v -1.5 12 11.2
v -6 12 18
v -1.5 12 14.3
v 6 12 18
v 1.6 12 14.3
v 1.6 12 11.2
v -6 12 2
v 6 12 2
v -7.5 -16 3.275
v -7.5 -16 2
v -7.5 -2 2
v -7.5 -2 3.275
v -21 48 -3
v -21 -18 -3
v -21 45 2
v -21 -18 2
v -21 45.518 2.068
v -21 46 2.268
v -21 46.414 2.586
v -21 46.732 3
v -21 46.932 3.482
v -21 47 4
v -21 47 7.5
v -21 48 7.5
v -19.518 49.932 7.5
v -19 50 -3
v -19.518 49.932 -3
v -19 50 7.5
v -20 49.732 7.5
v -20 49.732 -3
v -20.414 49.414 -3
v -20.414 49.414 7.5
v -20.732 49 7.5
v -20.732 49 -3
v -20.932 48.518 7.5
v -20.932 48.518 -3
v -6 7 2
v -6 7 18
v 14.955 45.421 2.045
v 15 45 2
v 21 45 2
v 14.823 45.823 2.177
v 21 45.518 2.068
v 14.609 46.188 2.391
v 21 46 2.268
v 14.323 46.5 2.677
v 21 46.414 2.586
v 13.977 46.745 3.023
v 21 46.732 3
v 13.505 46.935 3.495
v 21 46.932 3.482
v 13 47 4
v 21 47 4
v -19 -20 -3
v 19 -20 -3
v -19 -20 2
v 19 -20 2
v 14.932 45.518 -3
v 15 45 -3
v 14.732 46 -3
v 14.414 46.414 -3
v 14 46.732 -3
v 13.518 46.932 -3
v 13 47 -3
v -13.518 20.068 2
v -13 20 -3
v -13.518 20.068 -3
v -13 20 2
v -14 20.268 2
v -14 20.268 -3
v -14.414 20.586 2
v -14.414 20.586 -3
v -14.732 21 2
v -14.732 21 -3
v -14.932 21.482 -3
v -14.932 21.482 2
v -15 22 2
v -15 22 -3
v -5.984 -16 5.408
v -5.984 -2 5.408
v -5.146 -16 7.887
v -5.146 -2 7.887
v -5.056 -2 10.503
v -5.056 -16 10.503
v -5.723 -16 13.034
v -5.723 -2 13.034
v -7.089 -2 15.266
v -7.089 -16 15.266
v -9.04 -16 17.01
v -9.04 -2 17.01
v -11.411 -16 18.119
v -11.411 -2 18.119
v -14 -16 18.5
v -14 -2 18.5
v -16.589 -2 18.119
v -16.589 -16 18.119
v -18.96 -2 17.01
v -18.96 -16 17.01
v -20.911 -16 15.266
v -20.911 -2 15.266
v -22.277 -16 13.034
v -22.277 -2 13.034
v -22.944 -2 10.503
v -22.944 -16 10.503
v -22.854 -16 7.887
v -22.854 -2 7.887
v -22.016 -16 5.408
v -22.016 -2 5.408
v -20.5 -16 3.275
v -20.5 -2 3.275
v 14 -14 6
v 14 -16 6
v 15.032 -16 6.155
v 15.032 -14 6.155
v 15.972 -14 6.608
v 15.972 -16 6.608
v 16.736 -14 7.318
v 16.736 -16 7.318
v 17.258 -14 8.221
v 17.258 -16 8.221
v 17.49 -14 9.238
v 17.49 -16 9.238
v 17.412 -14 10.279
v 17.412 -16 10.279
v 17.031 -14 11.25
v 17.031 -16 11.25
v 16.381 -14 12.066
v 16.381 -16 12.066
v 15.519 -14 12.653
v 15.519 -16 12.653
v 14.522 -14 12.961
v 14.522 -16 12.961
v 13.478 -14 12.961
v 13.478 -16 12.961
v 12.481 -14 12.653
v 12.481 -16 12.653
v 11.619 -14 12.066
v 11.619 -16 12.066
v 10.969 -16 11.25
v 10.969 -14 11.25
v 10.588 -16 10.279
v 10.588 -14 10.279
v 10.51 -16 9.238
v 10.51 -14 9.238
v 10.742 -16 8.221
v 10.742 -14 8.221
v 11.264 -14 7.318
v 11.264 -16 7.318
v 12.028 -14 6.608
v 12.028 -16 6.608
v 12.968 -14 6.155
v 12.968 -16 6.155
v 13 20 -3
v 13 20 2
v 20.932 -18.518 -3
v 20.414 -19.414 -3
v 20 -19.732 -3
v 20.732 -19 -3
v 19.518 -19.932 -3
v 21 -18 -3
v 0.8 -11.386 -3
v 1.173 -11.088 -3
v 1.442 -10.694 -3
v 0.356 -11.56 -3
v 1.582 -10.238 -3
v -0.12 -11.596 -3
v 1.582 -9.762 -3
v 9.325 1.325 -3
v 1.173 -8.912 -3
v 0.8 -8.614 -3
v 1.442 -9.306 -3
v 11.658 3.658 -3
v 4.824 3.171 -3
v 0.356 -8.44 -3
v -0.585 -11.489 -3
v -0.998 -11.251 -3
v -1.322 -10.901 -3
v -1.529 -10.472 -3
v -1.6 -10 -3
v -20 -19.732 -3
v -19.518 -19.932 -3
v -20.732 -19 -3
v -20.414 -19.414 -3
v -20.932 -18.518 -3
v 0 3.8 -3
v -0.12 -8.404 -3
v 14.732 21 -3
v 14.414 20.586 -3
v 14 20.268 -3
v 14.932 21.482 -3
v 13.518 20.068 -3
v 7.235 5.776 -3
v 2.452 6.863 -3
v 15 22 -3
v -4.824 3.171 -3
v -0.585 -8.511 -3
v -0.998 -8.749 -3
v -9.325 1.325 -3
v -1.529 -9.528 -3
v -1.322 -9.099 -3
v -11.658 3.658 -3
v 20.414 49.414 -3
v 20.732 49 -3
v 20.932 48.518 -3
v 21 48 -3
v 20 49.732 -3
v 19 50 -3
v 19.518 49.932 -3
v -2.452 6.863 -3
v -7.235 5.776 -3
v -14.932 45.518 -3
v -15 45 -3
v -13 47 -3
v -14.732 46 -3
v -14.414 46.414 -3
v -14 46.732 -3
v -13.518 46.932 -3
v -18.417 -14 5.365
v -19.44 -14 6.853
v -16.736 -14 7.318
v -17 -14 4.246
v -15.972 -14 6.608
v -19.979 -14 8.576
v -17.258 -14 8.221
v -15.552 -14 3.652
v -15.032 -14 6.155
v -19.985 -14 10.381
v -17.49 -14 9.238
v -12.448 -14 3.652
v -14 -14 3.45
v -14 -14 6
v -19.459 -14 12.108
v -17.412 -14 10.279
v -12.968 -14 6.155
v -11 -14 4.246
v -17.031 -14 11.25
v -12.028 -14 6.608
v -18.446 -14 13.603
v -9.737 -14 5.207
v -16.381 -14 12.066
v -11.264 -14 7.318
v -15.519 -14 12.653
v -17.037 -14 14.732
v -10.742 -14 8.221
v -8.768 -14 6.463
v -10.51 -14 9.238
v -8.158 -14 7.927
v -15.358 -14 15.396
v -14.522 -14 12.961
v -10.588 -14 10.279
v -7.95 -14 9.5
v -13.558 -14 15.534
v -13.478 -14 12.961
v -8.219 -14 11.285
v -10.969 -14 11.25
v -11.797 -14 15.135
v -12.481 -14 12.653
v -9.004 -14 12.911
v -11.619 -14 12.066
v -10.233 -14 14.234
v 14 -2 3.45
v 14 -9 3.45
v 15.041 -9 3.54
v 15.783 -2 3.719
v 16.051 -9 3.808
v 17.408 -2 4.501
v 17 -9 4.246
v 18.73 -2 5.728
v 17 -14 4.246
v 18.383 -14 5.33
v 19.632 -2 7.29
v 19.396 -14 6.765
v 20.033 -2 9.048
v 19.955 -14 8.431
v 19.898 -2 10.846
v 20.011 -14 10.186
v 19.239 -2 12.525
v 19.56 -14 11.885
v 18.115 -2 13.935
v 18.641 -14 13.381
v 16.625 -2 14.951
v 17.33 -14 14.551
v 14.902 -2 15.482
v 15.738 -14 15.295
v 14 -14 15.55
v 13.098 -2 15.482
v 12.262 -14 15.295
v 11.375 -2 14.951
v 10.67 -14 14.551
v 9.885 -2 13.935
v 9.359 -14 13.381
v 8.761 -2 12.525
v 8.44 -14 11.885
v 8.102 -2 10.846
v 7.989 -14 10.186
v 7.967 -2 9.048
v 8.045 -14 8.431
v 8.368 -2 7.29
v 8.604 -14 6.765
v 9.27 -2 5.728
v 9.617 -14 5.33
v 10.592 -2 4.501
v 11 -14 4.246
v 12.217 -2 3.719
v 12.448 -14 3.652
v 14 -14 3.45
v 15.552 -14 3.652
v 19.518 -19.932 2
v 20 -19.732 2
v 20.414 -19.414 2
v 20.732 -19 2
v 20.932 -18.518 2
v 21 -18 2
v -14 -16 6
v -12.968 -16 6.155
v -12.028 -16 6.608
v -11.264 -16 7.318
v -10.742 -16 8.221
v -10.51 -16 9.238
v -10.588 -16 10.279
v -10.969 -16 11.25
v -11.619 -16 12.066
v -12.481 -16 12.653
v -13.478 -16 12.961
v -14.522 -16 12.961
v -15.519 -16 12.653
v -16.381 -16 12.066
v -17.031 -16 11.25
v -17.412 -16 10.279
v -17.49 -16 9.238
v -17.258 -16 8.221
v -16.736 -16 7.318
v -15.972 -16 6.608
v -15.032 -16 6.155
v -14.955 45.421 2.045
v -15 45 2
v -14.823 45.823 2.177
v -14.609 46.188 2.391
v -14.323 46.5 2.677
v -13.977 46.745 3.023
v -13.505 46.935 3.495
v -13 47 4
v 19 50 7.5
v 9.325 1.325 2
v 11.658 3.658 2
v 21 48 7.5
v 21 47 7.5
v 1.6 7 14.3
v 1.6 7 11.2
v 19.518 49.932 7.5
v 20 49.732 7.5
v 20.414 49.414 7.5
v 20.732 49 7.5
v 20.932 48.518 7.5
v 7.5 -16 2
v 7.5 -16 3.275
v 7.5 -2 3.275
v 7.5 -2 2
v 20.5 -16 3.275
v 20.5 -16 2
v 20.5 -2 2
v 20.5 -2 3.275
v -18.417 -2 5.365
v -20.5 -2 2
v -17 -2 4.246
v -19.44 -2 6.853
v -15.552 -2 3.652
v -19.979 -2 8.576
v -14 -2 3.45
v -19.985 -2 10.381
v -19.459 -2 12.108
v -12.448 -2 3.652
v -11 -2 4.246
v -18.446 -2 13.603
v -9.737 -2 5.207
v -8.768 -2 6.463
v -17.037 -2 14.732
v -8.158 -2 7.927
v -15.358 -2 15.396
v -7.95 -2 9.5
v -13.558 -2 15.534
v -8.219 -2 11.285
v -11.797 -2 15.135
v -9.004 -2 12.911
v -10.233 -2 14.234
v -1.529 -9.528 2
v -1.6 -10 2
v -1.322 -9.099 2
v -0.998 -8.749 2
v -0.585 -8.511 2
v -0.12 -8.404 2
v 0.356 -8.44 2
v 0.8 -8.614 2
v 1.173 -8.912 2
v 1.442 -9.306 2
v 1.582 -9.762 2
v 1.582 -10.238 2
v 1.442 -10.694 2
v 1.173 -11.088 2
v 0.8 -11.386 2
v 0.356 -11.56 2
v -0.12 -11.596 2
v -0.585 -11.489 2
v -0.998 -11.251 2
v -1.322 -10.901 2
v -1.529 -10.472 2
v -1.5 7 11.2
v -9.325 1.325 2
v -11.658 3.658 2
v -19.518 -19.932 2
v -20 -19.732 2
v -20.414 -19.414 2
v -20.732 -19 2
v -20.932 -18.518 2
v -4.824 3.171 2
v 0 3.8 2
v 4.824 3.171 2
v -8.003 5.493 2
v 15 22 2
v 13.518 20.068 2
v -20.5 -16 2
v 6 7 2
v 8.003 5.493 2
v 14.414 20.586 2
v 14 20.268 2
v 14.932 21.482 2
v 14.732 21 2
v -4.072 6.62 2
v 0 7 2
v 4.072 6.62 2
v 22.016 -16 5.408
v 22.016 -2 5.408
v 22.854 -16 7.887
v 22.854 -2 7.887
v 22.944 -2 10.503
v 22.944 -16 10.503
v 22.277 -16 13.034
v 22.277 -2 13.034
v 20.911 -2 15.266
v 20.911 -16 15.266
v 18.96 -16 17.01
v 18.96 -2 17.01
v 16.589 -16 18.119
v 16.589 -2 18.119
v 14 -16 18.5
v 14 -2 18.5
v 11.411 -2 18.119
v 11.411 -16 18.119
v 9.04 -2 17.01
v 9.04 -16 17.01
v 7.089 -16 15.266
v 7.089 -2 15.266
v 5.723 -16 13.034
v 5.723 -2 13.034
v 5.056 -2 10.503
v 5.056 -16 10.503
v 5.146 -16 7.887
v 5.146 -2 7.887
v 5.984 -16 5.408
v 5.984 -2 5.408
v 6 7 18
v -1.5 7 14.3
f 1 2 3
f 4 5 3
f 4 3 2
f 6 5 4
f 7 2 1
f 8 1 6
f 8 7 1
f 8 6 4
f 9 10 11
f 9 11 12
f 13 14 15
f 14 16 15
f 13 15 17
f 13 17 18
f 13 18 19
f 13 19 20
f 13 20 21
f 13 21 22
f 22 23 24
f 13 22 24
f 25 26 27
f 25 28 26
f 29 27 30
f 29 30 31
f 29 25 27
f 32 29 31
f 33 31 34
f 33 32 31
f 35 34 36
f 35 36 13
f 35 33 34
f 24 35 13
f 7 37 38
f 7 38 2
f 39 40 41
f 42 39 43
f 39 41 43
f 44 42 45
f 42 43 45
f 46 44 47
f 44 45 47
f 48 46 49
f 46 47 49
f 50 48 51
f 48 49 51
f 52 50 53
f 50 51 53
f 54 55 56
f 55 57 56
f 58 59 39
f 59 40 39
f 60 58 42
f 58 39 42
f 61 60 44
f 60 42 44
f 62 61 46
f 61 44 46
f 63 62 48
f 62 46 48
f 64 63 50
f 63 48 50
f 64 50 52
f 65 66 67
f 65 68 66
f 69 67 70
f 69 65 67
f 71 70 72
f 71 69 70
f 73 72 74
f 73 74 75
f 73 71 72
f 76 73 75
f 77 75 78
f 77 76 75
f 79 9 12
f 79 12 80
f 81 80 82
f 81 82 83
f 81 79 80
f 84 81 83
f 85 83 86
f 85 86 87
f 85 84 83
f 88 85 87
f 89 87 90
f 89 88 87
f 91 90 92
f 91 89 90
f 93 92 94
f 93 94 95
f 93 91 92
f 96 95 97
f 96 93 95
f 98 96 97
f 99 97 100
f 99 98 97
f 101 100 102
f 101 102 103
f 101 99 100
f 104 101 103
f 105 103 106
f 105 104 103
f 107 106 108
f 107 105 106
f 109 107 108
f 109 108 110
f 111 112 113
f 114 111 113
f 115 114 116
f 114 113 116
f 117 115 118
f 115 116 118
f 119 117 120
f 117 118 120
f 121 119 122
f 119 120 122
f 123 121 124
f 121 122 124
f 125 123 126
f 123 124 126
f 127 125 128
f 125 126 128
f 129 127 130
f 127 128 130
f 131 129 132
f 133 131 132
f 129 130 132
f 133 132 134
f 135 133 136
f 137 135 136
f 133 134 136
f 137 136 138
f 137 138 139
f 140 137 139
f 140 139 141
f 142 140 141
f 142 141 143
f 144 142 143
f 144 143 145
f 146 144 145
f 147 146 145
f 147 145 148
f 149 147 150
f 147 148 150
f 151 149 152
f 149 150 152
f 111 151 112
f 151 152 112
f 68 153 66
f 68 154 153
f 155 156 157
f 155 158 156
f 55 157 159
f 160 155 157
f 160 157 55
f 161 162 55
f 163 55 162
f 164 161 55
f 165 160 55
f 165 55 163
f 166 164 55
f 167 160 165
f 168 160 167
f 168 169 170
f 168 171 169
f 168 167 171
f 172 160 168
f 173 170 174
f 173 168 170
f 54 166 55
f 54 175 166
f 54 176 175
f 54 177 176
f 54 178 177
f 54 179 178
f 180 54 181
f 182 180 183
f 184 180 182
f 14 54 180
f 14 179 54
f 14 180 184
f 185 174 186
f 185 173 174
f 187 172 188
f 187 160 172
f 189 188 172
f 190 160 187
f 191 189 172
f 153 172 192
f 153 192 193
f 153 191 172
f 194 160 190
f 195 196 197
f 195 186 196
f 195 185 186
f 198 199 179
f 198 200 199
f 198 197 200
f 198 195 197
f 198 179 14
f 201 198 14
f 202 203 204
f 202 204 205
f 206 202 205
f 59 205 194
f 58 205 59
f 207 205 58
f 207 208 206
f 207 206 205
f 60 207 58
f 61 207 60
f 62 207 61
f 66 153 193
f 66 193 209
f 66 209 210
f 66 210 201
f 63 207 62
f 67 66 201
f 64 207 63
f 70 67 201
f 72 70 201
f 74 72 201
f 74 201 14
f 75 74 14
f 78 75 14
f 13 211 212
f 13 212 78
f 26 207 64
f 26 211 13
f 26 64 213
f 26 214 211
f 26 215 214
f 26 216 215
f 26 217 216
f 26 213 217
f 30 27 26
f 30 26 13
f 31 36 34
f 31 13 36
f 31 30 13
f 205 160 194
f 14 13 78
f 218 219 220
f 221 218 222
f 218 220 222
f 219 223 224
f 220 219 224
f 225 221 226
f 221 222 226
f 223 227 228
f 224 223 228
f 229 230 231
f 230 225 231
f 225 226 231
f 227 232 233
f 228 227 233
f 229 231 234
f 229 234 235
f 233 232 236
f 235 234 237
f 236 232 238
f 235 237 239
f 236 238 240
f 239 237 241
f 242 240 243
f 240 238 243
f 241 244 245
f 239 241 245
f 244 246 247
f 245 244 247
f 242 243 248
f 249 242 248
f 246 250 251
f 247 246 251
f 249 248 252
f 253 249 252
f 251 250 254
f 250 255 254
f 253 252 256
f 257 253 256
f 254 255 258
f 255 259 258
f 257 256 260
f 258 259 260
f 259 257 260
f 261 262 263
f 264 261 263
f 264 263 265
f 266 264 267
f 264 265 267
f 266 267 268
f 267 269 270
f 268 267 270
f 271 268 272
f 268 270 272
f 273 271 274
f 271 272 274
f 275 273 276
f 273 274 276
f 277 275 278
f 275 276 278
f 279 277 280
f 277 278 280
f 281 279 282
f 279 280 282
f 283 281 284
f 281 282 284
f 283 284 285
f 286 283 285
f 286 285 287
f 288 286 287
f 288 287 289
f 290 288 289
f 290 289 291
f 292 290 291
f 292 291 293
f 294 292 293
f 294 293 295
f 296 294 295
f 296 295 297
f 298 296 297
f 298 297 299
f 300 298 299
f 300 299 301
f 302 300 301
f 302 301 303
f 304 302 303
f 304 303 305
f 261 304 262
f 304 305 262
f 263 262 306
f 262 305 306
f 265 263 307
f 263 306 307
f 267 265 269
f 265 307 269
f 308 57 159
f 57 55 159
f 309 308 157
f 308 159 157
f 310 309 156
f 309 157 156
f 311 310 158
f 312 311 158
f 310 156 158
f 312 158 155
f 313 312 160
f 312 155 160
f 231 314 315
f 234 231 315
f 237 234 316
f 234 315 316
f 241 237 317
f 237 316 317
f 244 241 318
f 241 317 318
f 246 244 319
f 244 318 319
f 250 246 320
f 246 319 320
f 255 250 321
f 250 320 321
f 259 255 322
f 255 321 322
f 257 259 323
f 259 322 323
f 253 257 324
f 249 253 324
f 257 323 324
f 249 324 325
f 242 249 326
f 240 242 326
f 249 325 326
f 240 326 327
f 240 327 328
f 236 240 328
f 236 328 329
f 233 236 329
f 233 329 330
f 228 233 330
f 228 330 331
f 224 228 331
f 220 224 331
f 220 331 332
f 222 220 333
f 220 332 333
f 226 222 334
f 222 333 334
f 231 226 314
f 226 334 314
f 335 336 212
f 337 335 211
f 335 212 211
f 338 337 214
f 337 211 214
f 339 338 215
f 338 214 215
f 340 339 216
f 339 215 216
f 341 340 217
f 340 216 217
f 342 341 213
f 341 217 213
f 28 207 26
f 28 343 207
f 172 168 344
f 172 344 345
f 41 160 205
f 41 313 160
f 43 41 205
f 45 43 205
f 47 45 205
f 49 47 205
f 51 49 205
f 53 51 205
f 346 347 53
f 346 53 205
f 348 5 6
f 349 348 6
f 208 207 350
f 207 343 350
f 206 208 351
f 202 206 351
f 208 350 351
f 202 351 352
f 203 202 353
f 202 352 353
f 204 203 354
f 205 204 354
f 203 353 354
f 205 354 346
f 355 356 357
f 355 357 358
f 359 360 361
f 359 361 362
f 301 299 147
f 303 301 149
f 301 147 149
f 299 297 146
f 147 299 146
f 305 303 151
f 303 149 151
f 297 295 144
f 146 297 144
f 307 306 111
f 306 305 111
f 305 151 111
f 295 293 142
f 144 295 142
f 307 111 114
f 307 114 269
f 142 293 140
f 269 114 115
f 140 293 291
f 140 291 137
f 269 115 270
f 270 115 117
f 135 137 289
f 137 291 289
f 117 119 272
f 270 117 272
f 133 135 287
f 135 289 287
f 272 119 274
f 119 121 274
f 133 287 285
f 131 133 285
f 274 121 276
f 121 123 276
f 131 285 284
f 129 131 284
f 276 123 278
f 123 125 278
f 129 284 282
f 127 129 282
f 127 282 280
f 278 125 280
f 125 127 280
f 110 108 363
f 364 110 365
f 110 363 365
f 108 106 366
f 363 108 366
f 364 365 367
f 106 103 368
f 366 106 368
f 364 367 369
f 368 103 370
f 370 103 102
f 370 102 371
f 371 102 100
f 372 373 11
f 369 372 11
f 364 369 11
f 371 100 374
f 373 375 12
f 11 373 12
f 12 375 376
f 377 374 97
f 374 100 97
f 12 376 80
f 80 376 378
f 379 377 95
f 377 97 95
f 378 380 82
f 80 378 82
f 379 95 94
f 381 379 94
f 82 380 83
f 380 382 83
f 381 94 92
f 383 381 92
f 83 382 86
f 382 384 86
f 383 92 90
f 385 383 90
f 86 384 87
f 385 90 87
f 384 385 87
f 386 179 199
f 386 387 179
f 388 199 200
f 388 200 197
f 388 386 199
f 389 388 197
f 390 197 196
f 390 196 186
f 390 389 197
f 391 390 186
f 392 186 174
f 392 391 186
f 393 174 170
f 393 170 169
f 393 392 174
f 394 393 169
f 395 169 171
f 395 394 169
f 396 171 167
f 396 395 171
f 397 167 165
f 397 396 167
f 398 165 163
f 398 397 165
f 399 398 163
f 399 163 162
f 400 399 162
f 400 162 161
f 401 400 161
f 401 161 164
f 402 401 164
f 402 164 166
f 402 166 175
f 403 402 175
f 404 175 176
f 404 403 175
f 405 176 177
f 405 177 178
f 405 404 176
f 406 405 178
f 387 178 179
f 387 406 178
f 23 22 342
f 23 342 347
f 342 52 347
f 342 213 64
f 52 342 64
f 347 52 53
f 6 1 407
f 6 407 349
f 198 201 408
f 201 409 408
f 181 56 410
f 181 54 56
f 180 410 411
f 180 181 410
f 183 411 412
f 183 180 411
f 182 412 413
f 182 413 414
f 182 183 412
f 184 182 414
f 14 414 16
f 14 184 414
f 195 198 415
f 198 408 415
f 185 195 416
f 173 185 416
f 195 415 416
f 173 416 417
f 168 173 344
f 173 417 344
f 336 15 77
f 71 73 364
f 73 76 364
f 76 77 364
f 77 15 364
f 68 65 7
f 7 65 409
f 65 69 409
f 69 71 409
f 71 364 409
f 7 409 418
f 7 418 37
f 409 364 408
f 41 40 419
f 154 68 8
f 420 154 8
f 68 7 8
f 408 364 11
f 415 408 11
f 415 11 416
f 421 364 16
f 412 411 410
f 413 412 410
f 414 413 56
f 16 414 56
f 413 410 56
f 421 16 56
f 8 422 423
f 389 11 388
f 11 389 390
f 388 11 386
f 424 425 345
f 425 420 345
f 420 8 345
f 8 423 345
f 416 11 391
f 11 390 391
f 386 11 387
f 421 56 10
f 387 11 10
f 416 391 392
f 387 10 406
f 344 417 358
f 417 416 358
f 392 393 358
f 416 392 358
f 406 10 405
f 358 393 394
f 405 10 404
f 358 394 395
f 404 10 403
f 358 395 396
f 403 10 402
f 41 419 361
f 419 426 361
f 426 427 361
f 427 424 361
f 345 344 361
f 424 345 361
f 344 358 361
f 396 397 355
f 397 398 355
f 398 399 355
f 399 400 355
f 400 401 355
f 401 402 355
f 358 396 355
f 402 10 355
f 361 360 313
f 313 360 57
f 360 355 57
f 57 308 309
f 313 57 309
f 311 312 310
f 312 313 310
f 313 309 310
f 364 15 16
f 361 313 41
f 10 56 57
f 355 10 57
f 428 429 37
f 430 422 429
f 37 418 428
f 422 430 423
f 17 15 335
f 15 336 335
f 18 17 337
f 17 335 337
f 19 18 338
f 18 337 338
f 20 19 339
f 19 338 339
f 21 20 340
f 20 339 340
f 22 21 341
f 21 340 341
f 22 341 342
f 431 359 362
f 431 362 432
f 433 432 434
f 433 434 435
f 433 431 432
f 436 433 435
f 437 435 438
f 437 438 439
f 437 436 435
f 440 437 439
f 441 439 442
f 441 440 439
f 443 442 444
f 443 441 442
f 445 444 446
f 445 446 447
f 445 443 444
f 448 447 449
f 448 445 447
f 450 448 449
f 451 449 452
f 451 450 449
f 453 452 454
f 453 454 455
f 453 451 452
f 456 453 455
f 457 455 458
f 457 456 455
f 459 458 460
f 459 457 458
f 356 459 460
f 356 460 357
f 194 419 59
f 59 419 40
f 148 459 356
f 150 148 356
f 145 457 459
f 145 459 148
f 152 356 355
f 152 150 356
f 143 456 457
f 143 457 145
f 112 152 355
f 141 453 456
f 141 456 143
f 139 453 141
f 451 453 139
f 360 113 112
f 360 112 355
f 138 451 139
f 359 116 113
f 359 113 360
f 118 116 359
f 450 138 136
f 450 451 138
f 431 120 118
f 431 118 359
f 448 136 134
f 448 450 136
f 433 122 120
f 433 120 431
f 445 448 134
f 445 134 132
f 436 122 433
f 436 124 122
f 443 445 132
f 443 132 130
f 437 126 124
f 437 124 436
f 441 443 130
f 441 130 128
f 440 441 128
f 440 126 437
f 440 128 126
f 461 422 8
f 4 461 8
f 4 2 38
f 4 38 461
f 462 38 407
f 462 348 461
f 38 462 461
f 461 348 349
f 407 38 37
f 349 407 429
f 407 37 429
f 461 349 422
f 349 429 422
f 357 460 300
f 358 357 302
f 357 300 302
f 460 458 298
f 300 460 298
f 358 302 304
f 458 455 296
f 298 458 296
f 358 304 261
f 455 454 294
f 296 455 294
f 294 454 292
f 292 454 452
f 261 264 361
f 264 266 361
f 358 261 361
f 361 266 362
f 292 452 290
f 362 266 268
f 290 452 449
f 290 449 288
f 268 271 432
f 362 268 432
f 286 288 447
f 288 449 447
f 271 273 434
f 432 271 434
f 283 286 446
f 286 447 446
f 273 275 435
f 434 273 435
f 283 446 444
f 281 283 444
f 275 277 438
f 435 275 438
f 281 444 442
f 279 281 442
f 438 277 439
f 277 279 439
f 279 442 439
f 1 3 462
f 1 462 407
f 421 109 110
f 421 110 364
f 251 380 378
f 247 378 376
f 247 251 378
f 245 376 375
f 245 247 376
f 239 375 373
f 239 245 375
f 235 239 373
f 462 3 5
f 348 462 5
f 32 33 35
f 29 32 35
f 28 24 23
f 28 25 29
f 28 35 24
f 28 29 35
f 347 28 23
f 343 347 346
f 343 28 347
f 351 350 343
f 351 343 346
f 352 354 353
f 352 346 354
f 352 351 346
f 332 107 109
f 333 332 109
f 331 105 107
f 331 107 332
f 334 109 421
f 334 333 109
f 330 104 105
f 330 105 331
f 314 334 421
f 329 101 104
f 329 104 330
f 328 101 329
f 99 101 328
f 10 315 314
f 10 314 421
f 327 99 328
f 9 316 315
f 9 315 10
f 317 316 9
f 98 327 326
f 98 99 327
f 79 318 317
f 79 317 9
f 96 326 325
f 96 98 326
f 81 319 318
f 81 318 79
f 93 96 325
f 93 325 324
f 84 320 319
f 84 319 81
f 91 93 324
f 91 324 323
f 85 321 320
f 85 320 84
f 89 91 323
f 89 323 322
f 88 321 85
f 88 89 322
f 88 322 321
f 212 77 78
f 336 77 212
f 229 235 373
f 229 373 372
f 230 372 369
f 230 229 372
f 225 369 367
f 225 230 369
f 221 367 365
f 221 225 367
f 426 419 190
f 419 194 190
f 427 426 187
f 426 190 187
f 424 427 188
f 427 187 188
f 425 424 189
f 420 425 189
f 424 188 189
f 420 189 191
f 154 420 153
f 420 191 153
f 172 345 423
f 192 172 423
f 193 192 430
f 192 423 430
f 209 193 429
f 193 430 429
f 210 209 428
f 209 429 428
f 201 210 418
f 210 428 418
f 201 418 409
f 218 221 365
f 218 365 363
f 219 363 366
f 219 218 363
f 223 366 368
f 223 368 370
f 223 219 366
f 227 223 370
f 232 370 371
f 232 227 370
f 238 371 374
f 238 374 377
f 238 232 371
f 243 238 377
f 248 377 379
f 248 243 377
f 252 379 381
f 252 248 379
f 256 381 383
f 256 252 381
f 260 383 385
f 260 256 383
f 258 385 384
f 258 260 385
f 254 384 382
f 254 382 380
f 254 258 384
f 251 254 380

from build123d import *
from build123d.topology import SkipClean

# Parameters (mm, degrees)
SKETCH1_W                                    = 42
SKETCH1_H                                    = 40
BOSS_EXTRUDE2_DEPTH                          = 2
SKETCH2_W                                    = 6
SKETCH2_H                                    = 4
BOSS_EXTRUDE5_DEPTH                          = 3
SKETCH4_R                                    = 3.5
SKETCH4_R_2                                  = 1.6
BOSS_EXTRUDE6_DEPTH                          = 4
MIRROR2_AT_THE_SECOND_PLANE_COPY_1_SKETC_W   = 6
MIRROR2_AT_THE_SECOND_PLANE_COPY_1_SKETC_H   = 4
MIRROR2_AT_THE_SECOND_PLANE_COPY_1_DEPTH     = 3
MIRROR2_AT_THE_SECOND_PLANE_COPY_2_SKETC_R   = 3.5
MIRROR2_AT_THE_SECOND_PLANE_COPY_2_SKETC_R_2 = 1.6
MIRROR2_AT_THE_SECOND_PLANE_COPY_2_DEPTH     = 4
CUT_EXTRUDE2_DEPTH                           = 2
SKETCH8_R                                    = 1.6
CUT_EXTRUDE3_DEPTH                           = 2
SKETCH18_W                                   = 6
SKETCH18_H                                   = 2
BOSS_EXTRUDE10_DEPTH                         = 30
SKETCH19_W                                   = 42
SKETCH19_H                                   = 3.5
BOSS_EXTRUDE11_DEPTH                         = 3
SKETCH20_R                                   = 1.6
BOSS_EXTRUDE12_DEPTH                         = 10
SKETCH22_R                                   = 1.6
CUT_EXTRUDE4_DEPTH                           = 7
SKETCH23_R                                   = 6.05
BOSS_EXTRUDE14_DEPTH                         = 14
SKETCH21_R                                   = 1.6
CUT_EXTRUDE5_DEPTH                           = 10
CUT_EXTRUDE7_DEPTH                           = 22
CUT_EXTRUDE9_DEPTH                           = 2
BOSS_EXTRUDE19_START                         = 2
SKETCH32_R                                   = 3.5
BOSS_EXTRUDE19_DEPTH                         = 2
SKETCH33_W                                   = 42
SKETCH33_H                                   = 3
BOSS_EXTRUDE20_DEPTH                         = 4
SKETCH34_W                                   = 42
SKETCH34_H                                   = 70
SKETCH34_R                                   = 1.6
SKETCH34_W_2                                 = 30
SKETCH34_H_2                                 = 27
BOSS_EXTRUDE21_DEPTH                         = 3
BOSS_EXTRUDE22_DEPTH                         = 14
FILLET1_R                                    = 2
SKETCH36_W                                   = 12
SKETCH36_H                                   = 5
BOSS_EXTRUDE23_DEPTH                         = 16
SKETCH37_W                                   = 3.1
SKETCH37_H                                   = 3.1
CUT_EXTRUDE10_DEPTH                          = 12


with BuildPart() as part:
    # Sketch1 → Boss-Extrude2 (new body)
    with BuildSketch(Plane.XY):
        Rectangle(SKETCH1_W, SKETCH1_H)
    extrude(amount=BOSS_EXTRUDE2_DEPTH)

    # Sketch2 → Boss-Extrude5 (add)
    with BuildSketch(Plane.XY.offset(2)):
        with Locations((-14, 10)):
            Rectangle(SKETCH2_W, SKETCH2_H)
    boss_extrude5 = extrude(amount=BOSS_EXTRUDE5_DEPTH)

    # Sketch4 → Boss-Extrude6 (add)
    with BuildSketch(Plane(origin=(0, 12, 0), x_dir=(1, 0, 0), z_dir=(0, 1, 0))):
        with Locations((-14, -6.6)):
            Circle(SKETCH4_R)
        with Locations(Location((-14, -6.6, 0), (0, 0, 270))):
            Circle(SKETCH4_R_2, mode=Mode.SUBTRACT)
    boss_extrude6 = extrude(amount=-BOSS_EXTRUDE6_DEPTH)

    # Mirror2: Boss-Extrude5, Boss-Extrude6 across plane
    add(boss_extrude5.mirror(Plane(origin=(0, 0, 0), x_dir=(0, 0, 1), z_dir=(1, 0, 0))))
    add(boss_extrude6.mirror(Plane(origin=(0, 0, 0), x_dir=(0, 0, 1), z_dir=(1, 0, 0))))

    # Mirror2 at the second plane: Boss-Extrude5, Boss-Extrude6 across plane
    add(boss_extrude5.mirror(Plane(origin=(0, 3, 0), x_dir=(0, 0, 1), z_dir=(0, -1, 0))))
    add(boss_extrude6.mirror(Plane(origin=(0, 3, 0), x_dir=(0, 0, 1), z_dir=(0, -1, 0))))

    # Mirror2 at the second plane copy 1 sketc → Mirror2 at the second plane copy 1 (add)
    with BuildSketch(Plane(origin=(0, 6, 2), x_dir=(-1, 0, 0), z_dir=(0, 0, 1))):
        with Locations((-14, 10)):
            Rectangle(MIRROR2_AT_THE_SECOND_PLANE_COPY_1_SKETC_W, MIRROR2_AT_THE_SECOND_PLANE_COPY_1_SKETC_H)
    extrude(amount=MIRROR2_AT_THE_SECOND_PLANE_COPY_1_DEPTH)

    # Mirror2 at the second plane copy 2 sketc → Mirror2 at the second plane copy 2 (add)
    with BuildSketch(Plane(origin=(0, -6, 0), x_dir=(-1, 0, 0), z_dir=(0, -1, 0))):
        with Locations((-14, -6.6)):
            Circle(MIRROR2_AT_THE_SECOND_PLANE_COPY_2_SKETC_R)
        with Locations(Location((-14, -6.6, 0), (0, 0, 270))):
            Circle(MIRROR2_AT_THE_SECOND_PLANE_COPY_2_SKETC_R_2, mode=Mode.SUBTRACT)
    extrude(amount=-MIRROR2_AT_THE_SECOND_PLANE_COPY_2_DEPTH)

    # Sketch7 → Cut-Extrude2 (cut)
    with BuildSketch(Plane.XY.offset(2)):
        with BuildLine():
            ThreePointArc((9.324585763, 1.324585763), (0, 3.8), (-9.324585763, 1.324585763))
            Line((-9.324585763, 1.324585763), (-11.657506391, 3.657506391))
            ThreePointArc((-11.657506391, 3.657506391), (0, 7), (11.657506391, 3.657506391))
            Line((11.657506391, 3.657506391), (9.324585763, 1.324585763))
        make_face()
    extrude(amount=-CUT_EXTRUDE2_DEPTH, mode=Mode.SUBTRACT)

    # Sketch8 → Cut-Extrude3 (cut)
    with BuildSketch(Plane(origin=(0, 0, 0), x_dir=(-1, 0, 0), z_dir=(0, 0, -1))):
        with Locations((0, -10)):
            Circle(SKETCH8_R)
    extrude(amount=-CUT_EXTRUDE3_DEPTH, mode=Mode.SUBTRACT)

    # Sketch18 → Boss-Extrude10 (add)
    with BuildSketch(Plane(origin=(0, 20, 0), x_dir=(1, 0, 0), z_dir=(0, 1, 0))):
        with Locations((-18, -1)):
            Rectangle(SKETCH18_W, SKETCH18_H)
        with Locations((18, -1)):
            Rectangle(SKETCH18_W, SKETCH18_H)
    extrude(amount=BOSS_EXTRUDE10_DEPTH)

    # Sketch19 → Boss-Extrude11 (add)
    with BuildSketch(Plane(origin=(0, 50, 0), x_dir=(1, 0, 0), z_dir=(0, 1, 0))):
        with Locations((0, -1.75)):
            Rectangle(SKETCH19_W, SKETCH19_H)
    extrude(amount=-BOSS_EXTRUDE11_DEPTH)

    # Sketch20 → Boss-Extrude12 (add)
    # profile 1 of 2: a face of its own
    with SkipClean():  # the faces are left unmerged after this step: merging them gives an invalid solid
        with BuildSketch(Plane.XZ.offset(6)):
            with BuildLine():
                Line((-11, 2), (-11, 4.797224362))
                ThreePointArc((-11, 4.797224362), (-14, 10.1), (-17, 4.797224362))
                Line((-17, 4.797224362), (-17, 2))
                Line((-17, 2), (-11, 2))
            make_face()
            with Locations(Location((-14, 6.6, 0), (0, 0, 90))):
                Circle(SKETCH20_R, mode=Mode.SUBTRACT)
        # profile 2 of 2: a face of its own
        with BuildSketch(Plane.XZ.offset(6)):
            with BuildLine():
                Line((11, 4.797224362), (11, 2))
                Line((11, 2), (17, 2))
                Line((17, 2), (17, 4.797224362))
                ThreePointArc((17, 4.797224362), (14, 10.1), (11, 4.797224362))
            make_face()
            with Locations(Location((14, 6.6, 0), (0, 0, 90))):
                Circle(SKETCH20_R, mode=Mode.SUBTRACT)
        extrude(amount=BOSS_EXTRUDE12_DEPTH)

    # Sketch22 → Cut-Extrude4 (cut)
    # profile 1 of 2: a face of its own
    with BuildSketch(Plane(origin=(0, -2, 0), x_dir=(1, 0, 0), z_dir=(0, 1, 0))):
        with BuildLine():
            Line((11, -2), (11, -4.797224362))
            ThreePointArc((11, -4.797224362), (14, -10.1), (17, -4.797224362))
            Line((17, -4.797224362), (17, -2))
            Line((17, -2), (11, -2))
        make_face()
        with Locations(Location((14, -6.6, 0), (0, 0, 90))):
            Circle(SKETCH22_R, mode=Mode.SUBTRACT)
    # profile 2 of 2: a face of its own
    with BuildSketch(Plane(origin=(0, -2, 0), x_dir=(1, 0, 0), z_dir=(0, 1, 0))):
        with BuildLine():
            Line((-11, -4.797224362), (-11, -2))
            Line((-11, -2), (-17, -2))
            Line((-17, -2), (-17, -4.797224362))
            ThreePointArc((-17, -4.797224362), (-14, -10.1), (-11, -4.797224362))
        make_face()
        with Locations(Location((-14, -6.6, 0), (0, 0, 90))):
            Circle(SKETCH22_R, mode=Mode.SUBTRACT)
    extrude(amount=-CUT_EXTRUDE4_DEPTH, mode=Mode.SUBTRACT)

    # Sketch23 → Boss-Extrude14 (add)
    # profile 1 of 3: a face of its own
    with BuildSketch(Plane.XZ.offset(16)):
        with BuildLine():
            Line((-19, 2), (-17, 2))
            Line((-17, 2), (-17, 4.246191857))
            ThreePointArc((-17, 4.246191857), (-17.03747428, 14.732231837), (-7.95, 9.5))
            ThreePointArc((-7.95, 9.5), (-8.767768163, 6.46252572), (-11, 4.246191857))
            Line((-11, 4.246191857), (-11, 2))
            Line((-11, 2), (-9, 2))
            Line((-9, 2), (-9, 3.909830056))
            ThreePointArc((-9, 3.909830056), (-14, 17), (-19, 3.909830056))
            Line((-19, 3.909830056), (-19, 2))
        make_face()
    # profile 2 of 3: a face of its own
    with BuildSketch(Plane.XZ.offset(16)):
        with BuildLine():
            Line((-17, 4.246191857), (-17, 2))
            Line((-17, 2), (-11, 2))
            Line((-11, 2), (-11, 4.246191857))
            ThreePointArc((-11, 4.246191857), (-14, 3.45), (-17, 4.246191857))
        make_face()
    # profile 3 of 3: a face of its own
    with BuildSketch(Plane.XZ.offset(16)):
        with BuildLine():
            ThreePointArc((9, 3.909830056), (14, 17), (19, 3.909830056))
            Line((19, 3.909830056), (19, 2))
            Line((19, 2), (9, 2))
            Line((9, 2), (9, 3.909830056))
        make_face()
        with Locations(Location((14, 9.5, 0), (0, 0, 270))):
            Circle(SKETCH23_R, mode=Mode.SUBTRACT)
    extrude(amount=-BOSS_EXTRUDE14_DEPTH)

    # Sketch21 → Cut-Extrude5 (cut)
    # profile 1 of 2: a face of its own
    with BuildSketch(Plane(origin=(0, 12, 0), x_dir=(1, 0, 0), z_dir=(0, 1, 0))):
        with BuildLine():
            Line((11, -2), (11, -4.797224362))
            ThreePointArc((11, -4.797224362), (14, -10.1), (17, -4.797224362))
            Line((17, -4.797224362), (17, -2))
            Line((17, -2), (11, -2))
        make_face()
        with Locations(Location((14, -6.6, 0), (0, 0, 90))):
            Circle(SKETCH21_R, mode=Mode.SUBTRACT)
    # profile 2 of 2: a face of its own
    with BuildSketch(Plane(origin=(0, 12, 0), x_dir=(1, 0, 0), z_dir=(0, 1, 0))):
        with BuildLine():
            Line((-11, -4.797224362), (-11, -2))
            Line((-11, -2), (-17, -2))
            Line((-17, -2), (-17, -4.797224362))
            ThreePointArc((-17, -4.797224362), (-14, -10.1), (-11, -4.797224362))
        make_face()
        with Locations(Location((-14, -6.6, 0), (0, 0, 90))):
            Circle(SKETCH21_R, mode=Mode.SUBTRACT)
    extrude(amount=-CUT_EXTRUDE5_DEPTH, mode=Mode.SUBTRACT)

    # Sketch24 → Cut-Extrude7 (cut)
    with BuildSketch(Plane(origin=(0, -9, 0), x_dir=(1, 0, 0), z_dir=(0, 1, 0))):
        with BuildLine():
            Line((11, -4.246191857), (11, -4.797224362))
            ThreePointArc((11, -4.797224362), (14, -10.1), (17, -4.797224362))
            Line((17, -4.797224362), (17, -4.246191857))
            ThreePointArc((17, -4.246191857), (14, -3.45), (11, -4.246191857))
        make_face()
        with BuildLine():
            Line((-11, -4.797224362), (-11, -4.246191857))
            ThreePointArc((-11, -4.246191857), (-14, -3.45), (-17, -4.246191857))
            Line((-17, -4.246191857), (-17, -4.797224362))
            ThreePointArc((-17, -4.797224362), (-14, -10.1), (-11, -4.797224362))
        make_face()
    extrude(amount=-CUT_EXTRUDE7_DEPTH, mode=Mode.SUBTRACT)

    # Sketch25 → Cut-Extrude9 (cut)
    with BuildSketch(Plane.XZ.offset(16)):
        with BuildLine():
            Line((-19, 2), (-9, 2))
            Line((-9, 2), (-9, 3.909830056))
            ThreePointArc((-9, 3.909830056), (-14, 17), (-19, 3.909830056))
            Line((-19, 3.909830056), (-19, 2))
        make_face()
        with BuildLine():
            Line((9, 3.909830056), (9, 2))
            Line((9, 2), (19, 2))
            Line((19, 2), (19, 3.909830056))
            ThreePointArc((19, 3.909830056), (14, 17), (9, 3.909830056))
        make_face()
    extrude(amount=-CUT_EXTRUDE9_DEPTH, mode=Mode.SUBTRACT)

    # Sketch32 → Boss-Extrude19 (add)
    # profile 1 of 2: a face of its own
    with BuildSketch(Plane.XZ.offset(14).offset(BOSS_EXTRUDE19_START)):
        with BuildLine():
            Line((9, 3.909830056), (9, 2))
            Line((9, 2), (19, 2))
            Line((19, 2), (19, 3.909830056))
            ThreePointArc((19, 3.909830056), (14, 17), (9, 3.909830056))
        make_face()
        with Locations(Location((14, 9.5, 0), (0, 0, 270))):
            Circle(SKETCH32_R, mode=Mode.SUBTRACT)
    # profile 2 of 2: a face of its own
    with BuildSketch(Plane.XZ.offset(14).offset(BOSS_EXTRUDE19_START)):
        with BuildLine():
            Line((-19, 3.909830056), (-19, 2))
            Line((-19, 2), (-9, 2))
            Line((-9, 2), (-9, 3.909830056))
            ThreePointArc((-9, 3.909830056), (-14, 17), (-19, 3.909830056))
        make_face()
        with Locations(Location((-14, 9.5, 0), (0, 0, 270))):
            Circle(SKETCH32_R, mode=Mode.SUBTRACT)
    extrude(amount=-BOSS_EXTRUDE19_DEPTH)

    # Sketch33 → Boss-Extrude20 (add)
    with BuildSketch(Plane.XY.offset(3.5)):
        with Locations((0, 48.5)):
            Rectangle(SKETCH33_W, SKETCH33_H)
    extrude(amount=BOSS_EXTRUDE20_DEPTH)

    # Sketch34 → Boss-Extrude21 (add)
    with BuildSketch(Plane(origin=(0, 0, 0), x_dir=(-1, 0, 0), z_dir=(0, 0, -1))):
        with Locations((0, 15)):
            Rectangle(SKETCH34_W, SKETCH34_H)
        with Locations((0, -10)):
            Circle(SKETCH34_R, mode=Mode.SUBTRACT)
        with BuildLine():
            Line((11.657506391, 3.657506391), (9.324585763, 1.324585763))
            ThreePointArc((9.324585763, 1.324585763), (0, 3.8), (-9.324585763, 1.324585763))
            Line((-9.324585763, 1.324585763), (-11.657506391, 3.657506391))
            ThreePointArc((-11.657506391, 3.657506391), (0, 7), (11.657506391, 3.657506391))
        make_face(mode=Mode.SUBTRACT)
        with Locations((0, 33.5)):
            Rectangle(SKETCH34_W_2, SKETCH34_H_2, mode=Mode.SUBTRACT)
    extrude(amount=BOSS_EXTRUDE21_DEPTH)

    # Sketch35 → Boss-Extrude22 (add)
    # profile 1 of 2: a face of its own
    with BuildSketch(Plane.XZ.offset(16)):
        with BuildLine():
            Line((-20.5, 3.275050201), (-20.5, 0.5))
            Line((-20.5, 0.5), (-7.5, 0.5))
            Line((-7.5, 0.5), (-7.5, 3.275050201))
            ThreePointArc((-7.5, 3.275050201), (-14, 18.5), (-20.5, 3.275050201))
        make_face()
        with BuildLine():
            Line((-19, 3.909830056), (-19, 2))
            Line((-19, 2), (-9, 2))
            Line((-9, 2), (-9, 3.909830056))
            ThreePointArc((-9, 3.909830056), (-14, 17), (-19, 3.909830056))
        make_face(mode=Mode.SUBTRACT)
    # profile 2 of 2: a face of its own
    with BuildSketch(Plane.XZ.offset(16)):
        with BuildLine():
            Line((7.5, 3.275050201), (7.5, 0.5))
            Line((7.5, 0.5), (20.5, 0.5))
            Line((20.5, 0.5), (20.5, 3.275050201))
            ThreePointArc((20.5, 3.275050201), (14, 18.5), (7.5, 3.275050201))
        make_face()
        with BuildLine():
            Line((9, 3.909830056), (9, 2))
            Line((9, 2), (19, 2))
            Line((19, 2), (19, 3.909830056))
            ThreePointArc((19, 3.909830056), (14, 17), (9, 3.909830056))
        make_face(mode=Mode.SUBTRACT)
    extrude(amount=-BOSS_EXTRUDE22_DEPTH)

    # Fillet1
    fillet1_edges = [part.edges().sort_by_distance(p)[0] for p in [
        (21, 50, 2.25),
        (15, 20, -0.5),
        (-21, 50, 2.25),
        (-15, 20, -0.5),
        (-15, 47, -0.5),
        (18, 47, 2),
        (15, 47, -0.5),
        (-18, 47, 2),
        (21, -20, -0.5),
        (-21, -20, -0.5),
    ]]
    fillet(fillet1_edges, radius=FILLET1_R)

    # Sketch36 → Boss-Extrude23 (add)
    with BuildSketch(Plane.XY.offset(2)):
        with Locations((0, 9.5)):
            Rectangle(SKETCH36_W, SKETCH36_H)
    extrude(amount=BOSS_EXTRUDE23_DEPTH)

    # Sketch37 → Cut-Extrude10 (cut)
    with BuildSketch(Plane(origin=(0, 12, 0), x_dir=(1, 0, 0), z_dir=(0, 1, 0))):
        with Locations((0.05, -12.75)):
            Rectangle(SKETCH37_W, SKETCH37_H)
    extrude(amount=-CUT_EXTRUDE10_DEPTH, mode=Mode.SUBTRACT)


solid = part.part
